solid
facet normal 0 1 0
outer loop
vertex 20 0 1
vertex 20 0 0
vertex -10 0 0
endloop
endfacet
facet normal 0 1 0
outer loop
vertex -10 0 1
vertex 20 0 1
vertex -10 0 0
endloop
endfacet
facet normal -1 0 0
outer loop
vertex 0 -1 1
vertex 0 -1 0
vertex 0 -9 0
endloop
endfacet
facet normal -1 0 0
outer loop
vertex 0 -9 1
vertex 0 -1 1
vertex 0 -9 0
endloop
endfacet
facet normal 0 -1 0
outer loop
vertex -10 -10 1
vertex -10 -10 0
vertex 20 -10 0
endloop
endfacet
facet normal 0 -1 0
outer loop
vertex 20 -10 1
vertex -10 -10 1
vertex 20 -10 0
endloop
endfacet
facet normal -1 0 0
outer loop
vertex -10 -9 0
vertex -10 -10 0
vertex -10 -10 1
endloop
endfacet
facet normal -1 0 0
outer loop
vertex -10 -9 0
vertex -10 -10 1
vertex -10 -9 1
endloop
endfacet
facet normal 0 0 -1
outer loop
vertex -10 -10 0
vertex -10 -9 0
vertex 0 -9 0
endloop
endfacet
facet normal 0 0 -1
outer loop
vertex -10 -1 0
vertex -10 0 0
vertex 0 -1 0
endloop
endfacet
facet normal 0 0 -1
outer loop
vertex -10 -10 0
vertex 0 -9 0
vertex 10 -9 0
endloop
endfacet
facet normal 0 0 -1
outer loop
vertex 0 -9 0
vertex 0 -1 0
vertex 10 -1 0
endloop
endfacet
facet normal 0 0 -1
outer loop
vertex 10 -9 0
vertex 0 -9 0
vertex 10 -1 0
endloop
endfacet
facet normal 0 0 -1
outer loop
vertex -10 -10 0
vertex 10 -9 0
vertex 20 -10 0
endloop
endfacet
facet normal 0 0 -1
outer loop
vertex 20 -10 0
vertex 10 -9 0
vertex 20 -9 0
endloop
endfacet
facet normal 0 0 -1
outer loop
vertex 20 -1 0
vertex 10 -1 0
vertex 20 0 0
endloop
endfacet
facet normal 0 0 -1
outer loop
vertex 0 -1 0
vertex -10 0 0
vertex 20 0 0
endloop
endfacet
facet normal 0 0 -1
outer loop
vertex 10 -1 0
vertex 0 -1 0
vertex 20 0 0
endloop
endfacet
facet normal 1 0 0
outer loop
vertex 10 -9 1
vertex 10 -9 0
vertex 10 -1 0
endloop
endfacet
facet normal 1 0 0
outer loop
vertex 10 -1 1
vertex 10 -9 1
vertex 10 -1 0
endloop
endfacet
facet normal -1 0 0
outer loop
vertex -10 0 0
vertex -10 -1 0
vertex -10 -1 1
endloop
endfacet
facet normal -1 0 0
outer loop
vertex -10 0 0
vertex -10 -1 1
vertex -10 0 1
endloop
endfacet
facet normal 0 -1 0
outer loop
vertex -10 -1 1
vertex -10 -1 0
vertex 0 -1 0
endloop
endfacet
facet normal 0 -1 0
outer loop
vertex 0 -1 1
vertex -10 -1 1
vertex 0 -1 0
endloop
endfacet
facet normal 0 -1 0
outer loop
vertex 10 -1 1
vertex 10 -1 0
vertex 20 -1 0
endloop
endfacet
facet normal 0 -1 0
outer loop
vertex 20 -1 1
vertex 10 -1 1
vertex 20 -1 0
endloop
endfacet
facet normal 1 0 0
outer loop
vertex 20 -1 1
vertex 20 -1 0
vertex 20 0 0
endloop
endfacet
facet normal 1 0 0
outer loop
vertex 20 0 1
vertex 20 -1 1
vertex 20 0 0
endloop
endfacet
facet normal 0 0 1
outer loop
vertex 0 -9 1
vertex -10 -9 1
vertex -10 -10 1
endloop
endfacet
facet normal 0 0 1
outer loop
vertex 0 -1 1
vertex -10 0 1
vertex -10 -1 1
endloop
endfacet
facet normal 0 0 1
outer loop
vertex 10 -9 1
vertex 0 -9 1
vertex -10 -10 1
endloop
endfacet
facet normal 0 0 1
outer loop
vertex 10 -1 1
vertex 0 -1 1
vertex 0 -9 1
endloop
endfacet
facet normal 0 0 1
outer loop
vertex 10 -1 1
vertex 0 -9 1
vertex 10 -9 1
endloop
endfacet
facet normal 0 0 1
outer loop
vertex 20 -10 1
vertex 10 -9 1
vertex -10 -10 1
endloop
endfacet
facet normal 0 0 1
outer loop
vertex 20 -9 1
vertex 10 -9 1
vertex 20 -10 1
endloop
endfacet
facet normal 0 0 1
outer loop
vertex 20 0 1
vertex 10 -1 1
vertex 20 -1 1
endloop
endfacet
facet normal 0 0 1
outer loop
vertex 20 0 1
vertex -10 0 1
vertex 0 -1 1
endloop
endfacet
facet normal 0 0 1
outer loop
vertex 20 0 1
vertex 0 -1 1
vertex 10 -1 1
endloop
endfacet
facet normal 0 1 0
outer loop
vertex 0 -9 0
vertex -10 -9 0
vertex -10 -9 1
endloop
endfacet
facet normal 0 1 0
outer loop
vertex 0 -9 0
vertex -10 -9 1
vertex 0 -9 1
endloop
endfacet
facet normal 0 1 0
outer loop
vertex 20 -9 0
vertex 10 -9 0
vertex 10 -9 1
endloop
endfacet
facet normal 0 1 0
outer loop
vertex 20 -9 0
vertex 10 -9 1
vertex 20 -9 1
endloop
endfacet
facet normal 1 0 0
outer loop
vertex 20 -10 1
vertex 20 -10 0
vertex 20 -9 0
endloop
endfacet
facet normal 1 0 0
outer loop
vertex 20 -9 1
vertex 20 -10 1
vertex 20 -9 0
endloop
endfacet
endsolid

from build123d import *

# Parameters (mm, degrees)
F0_W     = 10
F0_H     = 1
F1_DEPTH = 1


with BuildPart() as f1:
    # F0 (on Top) → F1 (new body)
    with BuildSketch(Plane.XY):
        Polygon((10, 0), (0, 0), (0, -1), (0, -9), (0, -10), (10, -10), (10, -9), (10, -1), align=None)
        with Locations((-5, -0.5)):
            Rectangle(F0_W, F0_H)
        with Locations((15, -0.5)):
            Rectangle(F0_W, F0_H)
        with Locations((-5, -9.5)):
            Rectangle(F0_W, F0_H)
        with Locations((15, -9.5)):
            Rectangle(F0_W, F0_H)
    extrude(amount=F1_DEPTH)


solid = f1.part
